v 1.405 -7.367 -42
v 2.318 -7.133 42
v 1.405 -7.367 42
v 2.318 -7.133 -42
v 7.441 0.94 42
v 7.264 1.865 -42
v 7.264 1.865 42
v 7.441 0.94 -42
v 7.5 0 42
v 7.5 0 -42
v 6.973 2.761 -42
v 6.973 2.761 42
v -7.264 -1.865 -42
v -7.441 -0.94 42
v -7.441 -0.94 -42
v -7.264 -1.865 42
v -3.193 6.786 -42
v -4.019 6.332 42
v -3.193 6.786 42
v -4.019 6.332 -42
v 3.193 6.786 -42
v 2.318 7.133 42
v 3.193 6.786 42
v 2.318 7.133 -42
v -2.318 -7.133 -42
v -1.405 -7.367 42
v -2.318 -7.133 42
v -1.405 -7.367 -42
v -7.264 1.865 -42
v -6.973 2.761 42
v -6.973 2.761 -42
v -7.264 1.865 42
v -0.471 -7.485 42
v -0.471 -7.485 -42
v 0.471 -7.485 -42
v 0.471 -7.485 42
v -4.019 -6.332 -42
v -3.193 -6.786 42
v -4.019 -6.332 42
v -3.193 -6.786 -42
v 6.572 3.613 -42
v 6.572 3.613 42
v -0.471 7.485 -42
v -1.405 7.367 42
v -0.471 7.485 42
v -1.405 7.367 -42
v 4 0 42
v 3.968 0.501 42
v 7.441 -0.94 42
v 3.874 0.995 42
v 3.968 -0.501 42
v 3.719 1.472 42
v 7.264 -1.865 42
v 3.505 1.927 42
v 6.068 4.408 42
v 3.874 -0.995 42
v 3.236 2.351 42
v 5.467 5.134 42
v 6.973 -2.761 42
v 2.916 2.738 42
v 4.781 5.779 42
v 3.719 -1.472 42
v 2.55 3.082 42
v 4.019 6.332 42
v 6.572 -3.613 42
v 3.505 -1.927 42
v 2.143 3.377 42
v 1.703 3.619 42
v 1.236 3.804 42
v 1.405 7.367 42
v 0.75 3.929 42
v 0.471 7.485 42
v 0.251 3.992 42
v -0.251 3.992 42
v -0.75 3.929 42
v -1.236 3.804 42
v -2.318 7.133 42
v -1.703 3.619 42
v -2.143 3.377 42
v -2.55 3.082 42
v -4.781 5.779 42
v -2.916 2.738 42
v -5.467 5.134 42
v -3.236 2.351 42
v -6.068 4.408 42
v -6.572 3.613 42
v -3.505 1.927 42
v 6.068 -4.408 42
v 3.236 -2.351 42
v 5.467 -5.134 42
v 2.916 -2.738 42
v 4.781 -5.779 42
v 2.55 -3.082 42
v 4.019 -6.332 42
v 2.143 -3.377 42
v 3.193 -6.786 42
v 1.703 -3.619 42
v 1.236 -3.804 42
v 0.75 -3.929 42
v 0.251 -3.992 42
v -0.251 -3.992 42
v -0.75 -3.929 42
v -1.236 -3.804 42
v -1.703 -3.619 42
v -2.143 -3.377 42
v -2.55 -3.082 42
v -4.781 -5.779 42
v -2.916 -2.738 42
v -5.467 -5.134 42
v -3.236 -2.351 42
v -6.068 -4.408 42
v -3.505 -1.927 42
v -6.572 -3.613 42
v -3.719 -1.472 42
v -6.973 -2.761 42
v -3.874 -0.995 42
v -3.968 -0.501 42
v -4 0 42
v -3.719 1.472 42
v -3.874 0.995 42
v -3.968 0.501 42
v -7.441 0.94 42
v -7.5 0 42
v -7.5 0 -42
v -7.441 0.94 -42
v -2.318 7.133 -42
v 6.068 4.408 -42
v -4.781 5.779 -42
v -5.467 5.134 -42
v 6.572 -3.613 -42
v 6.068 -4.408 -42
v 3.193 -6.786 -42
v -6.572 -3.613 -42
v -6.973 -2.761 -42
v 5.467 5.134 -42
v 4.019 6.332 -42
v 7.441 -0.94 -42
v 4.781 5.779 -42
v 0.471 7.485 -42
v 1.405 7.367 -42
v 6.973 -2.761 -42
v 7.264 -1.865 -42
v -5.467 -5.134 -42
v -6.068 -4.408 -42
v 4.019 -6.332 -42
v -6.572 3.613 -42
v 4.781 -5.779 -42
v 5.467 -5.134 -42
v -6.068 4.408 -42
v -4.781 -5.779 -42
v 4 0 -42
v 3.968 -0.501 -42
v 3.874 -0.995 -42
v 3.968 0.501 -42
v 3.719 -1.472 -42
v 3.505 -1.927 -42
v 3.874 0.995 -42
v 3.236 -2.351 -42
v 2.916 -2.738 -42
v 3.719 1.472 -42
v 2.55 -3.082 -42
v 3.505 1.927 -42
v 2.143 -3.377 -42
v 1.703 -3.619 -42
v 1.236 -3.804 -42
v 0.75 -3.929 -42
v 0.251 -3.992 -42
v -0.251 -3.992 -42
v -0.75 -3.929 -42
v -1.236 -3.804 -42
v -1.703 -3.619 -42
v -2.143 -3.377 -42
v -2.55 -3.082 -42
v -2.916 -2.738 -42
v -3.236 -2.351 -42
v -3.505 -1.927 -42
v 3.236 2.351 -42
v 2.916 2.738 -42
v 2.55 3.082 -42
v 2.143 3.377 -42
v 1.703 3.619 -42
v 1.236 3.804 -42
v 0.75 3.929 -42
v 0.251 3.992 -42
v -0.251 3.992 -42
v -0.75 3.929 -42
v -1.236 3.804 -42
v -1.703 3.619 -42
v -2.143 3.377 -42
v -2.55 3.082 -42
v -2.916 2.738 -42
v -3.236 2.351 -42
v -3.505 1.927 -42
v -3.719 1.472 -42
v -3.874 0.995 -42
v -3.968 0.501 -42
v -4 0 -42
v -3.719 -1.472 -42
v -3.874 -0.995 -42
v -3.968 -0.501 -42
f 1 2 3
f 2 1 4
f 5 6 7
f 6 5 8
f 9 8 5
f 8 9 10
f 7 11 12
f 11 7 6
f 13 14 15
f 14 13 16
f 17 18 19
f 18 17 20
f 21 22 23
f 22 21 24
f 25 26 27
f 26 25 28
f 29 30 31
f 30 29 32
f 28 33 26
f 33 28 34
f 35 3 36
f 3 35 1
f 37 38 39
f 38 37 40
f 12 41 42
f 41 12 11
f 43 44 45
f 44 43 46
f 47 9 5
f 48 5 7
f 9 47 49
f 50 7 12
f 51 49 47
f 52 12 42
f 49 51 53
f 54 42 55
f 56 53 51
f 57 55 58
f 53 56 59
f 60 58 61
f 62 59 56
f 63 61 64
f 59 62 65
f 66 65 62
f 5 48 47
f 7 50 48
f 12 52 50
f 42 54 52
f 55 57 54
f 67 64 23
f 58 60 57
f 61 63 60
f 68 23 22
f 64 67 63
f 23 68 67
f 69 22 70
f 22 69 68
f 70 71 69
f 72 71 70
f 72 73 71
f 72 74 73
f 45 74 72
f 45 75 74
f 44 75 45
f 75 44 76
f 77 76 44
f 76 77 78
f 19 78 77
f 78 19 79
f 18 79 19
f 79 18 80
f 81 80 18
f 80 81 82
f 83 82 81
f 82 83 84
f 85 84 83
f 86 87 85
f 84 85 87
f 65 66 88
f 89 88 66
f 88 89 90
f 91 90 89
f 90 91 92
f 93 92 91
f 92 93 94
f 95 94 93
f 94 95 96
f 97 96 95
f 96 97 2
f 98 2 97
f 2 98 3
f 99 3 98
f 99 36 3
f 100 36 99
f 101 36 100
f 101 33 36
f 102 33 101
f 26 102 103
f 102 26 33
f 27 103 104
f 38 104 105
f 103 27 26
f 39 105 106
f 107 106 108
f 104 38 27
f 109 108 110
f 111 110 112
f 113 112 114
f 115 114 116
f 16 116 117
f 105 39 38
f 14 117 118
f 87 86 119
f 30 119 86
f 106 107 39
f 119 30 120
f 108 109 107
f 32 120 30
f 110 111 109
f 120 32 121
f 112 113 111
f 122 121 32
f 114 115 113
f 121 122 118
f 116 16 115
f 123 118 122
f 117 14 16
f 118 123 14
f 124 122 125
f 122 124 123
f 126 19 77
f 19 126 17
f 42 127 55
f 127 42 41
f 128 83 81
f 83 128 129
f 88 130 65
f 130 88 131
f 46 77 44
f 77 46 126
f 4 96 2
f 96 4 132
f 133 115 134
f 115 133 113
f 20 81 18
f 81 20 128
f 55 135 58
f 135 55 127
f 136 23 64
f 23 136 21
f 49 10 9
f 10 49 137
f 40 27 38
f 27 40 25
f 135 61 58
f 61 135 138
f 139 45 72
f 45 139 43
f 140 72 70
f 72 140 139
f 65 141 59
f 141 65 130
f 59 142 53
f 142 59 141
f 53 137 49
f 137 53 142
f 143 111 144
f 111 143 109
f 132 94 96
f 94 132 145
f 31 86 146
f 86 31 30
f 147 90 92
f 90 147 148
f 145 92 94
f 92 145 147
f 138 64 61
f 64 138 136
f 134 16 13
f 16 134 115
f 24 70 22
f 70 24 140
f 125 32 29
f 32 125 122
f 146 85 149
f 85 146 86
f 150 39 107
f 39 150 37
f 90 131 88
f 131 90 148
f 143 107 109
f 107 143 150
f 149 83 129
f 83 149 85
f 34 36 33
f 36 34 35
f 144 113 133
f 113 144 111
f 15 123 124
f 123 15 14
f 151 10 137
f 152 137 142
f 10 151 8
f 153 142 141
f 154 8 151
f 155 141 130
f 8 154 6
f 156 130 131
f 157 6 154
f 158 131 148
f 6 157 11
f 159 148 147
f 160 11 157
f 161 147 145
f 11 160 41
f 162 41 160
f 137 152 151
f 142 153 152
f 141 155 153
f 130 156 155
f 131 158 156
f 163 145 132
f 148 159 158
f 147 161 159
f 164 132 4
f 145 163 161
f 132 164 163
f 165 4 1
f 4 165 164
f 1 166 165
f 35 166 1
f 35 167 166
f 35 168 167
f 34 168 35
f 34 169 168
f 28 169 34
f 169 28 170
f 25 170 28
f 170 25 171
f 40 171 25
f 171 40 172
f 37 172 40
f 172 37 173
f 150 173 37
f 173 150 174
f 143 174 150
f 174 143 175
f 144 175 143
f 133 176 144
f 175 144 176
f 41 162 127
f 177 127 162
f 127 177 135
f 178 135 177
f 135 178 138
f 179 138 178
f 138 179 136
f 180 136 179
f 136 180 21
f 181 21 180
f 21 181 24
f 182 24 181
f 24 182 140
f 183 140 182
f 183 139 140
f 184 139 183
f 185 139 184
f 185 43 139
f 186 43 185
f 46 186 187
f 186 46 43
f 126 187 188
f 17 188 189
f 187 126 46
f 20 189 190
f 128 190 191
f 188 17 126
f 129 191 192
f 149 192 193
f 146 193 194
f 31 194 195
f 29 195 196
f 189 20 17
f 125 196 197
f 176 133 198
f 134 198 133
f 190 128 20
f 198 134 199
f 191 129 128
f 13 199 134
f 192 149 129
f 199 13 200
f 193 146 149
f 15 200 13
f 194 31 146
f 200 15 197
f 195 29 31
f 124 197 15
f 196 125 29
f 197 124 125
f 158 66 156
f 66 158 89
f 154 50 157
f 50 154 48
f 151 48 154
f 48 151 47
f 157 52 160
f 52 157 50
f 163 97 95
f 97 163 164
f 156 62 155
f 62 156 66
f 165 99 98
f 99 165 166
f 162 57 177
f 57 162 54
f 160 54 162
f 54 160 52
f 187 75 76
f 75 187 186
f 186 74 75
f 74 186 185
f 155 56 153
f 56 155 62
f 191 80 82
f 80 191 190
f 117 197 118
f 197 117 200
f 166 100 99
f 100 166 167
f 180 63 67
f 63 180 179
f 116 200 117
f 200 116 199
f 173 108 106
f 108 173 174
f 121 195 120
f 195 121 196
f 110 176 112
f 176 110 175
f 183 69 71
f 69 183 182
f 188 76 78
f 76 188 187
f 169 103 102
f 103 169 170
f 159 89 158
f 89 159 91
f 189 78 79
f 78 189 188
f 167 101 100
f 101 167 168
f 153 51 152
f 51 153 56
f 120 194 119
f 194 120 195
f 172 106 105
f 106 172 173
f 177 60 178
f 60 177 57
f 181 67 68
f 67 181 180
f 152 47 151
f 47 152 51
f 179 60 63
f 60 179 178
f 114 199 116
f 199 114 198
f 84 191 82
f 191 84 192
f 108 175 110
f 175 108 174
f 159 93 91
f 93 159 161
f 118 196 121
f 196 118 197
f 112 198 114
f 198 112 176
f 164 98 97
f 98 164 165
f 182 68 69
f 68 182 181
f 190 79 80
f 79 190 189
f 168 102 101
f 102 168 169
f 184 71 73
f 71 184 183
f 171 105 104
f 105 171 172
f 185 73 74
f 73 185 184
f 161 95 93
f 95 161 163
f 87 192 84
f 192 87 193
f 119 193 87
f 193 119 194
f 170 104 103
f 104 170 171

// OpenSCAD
$fn = 50;


difference() {
	union() {
		translate(v = [0, 0, -42.0000000000]) {
			cylinder(h = 84, r = 7.5000000000);
		}
	}
	union() {
		translate(v = [0, 0, -100.0000000000]) {
			cylinder(h = 200, r = 4.0000000000);
		}
	}
}
